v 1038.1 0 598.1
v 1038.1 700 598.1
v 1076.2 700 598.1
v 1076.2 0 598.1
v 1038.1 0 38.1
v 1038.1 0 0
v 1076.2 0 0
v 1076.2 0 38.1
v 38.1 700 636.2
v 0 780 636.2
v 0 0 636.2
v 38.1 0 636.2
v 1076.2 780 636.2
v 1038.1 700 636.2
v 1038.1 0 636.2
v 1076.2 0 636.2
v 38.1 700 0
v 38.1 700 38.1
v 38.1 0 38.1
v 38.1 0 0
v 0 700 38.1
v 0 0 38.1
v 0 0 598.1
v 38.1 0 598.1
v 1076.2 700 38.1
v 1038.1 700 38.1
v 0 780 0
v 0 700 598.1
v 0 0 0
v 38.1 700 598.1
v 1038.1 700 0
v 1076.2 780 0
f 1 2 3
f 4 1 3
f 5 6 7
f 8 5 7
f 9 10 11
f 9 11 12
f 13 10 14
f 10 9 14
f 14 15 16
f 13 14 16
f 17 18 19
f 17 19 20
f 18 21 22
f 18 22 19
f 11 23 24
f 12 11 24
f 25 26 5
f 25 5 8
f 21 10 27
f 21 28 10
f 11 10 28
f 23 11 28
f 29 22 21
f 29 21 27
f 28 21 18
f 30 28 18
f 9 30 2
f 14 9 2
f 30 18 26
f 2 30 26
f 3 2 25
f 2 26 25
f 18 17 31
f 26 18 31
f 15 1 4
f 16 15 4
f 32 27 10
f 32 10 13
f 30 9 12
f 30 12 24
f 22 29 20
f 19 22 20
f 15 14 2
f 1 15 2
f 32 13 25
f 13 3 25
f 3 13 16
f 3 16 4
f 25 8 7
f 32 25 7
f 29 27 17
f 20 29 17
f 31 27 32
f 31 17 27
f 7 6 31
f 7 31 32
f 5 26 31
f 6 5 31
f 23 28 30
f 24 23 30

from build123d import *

# Parameters (mm, degrees)
CROQUIS1_W                = 38.1
CROQUIS1_H                = 38.1
SALIENTE_EXTRUIR1_DEPTH   = 700
SALIENTE_EXTRUIR1_2_DEPTH = 700
SALIENTE_EXTRUIR1_3_DEPTH = 700
SALIENTE_EXTRUIR1_4_DEPTH = 700
CROQUIS2_W                = 1076.2
CROQUIS2_H                = 636.2
SALIENTE_EXTRUIR2_DEPTH   = 80


with BuildPart() as part:
    # Croquis1 → Saliente-Extruir1 (new body)
    with BuildSketch(Plane(origin=(0, 0, 0), x_dir=(1, 0, 0), z_dir=(0, 1, 0))):
        with Locations((19.05, -19.05)):
            Rectangle(CROQUIS1_W, CROQUIS1_H)
    extrude(amount=SALIENTE_EXTRUIR1_DEPTH)



with BuildPart() as body_2:
    # Croquis1 → Saliente-Extruir1 2 (new body)
    with BuildSketch(Plane(origin=(0, 0, 0), x_dir=(1, 0, 0), z_dir=(0, 1, 0))):
        with Locations((1057.15, -19.05)):
            Rectangle(CROQUIS1_W, CROQUIS1_H)
    extrude(amount=SALIENTE_EXTRUIR1_2_DEPTH)


with BuildPart() as body_3:
    # Croquis1 → Saliente-Extruir1 3 (new body)
    with BuildSketch(Plane(origin=(0, 0, 0), x_dir=(1, 0, 0), z_dir=(0, 1, 0))):
        with Locations((1057.15, -617.15)):
            Rectangle(CROQUIS1_W, CROQUIS1_H)
    extrude(amount=SALIENTE_EXTRUIR1_3_DEPTH)


with BuildPart() as body_4:
    # Croquis1 → Saliente-Extruir1 4 (new body)
    with BuildSketch(Plane(origin=(0, 0, 0), x_dir=(1, 0, 0), z_dir=(0, 1, 0))):
        with Locations((19.05, -617.15)):
            Rectangle(CROQUIS1_W, CROQUIS1_H)
    extrude(amount=SALIENTE_EXTRUIR1_4_DEPTH)


with BuildPart() as part_1:
    add(part.part)

    add(body_2.part)  # Saliente-Extruir2 merges body 2

    add(body_3.part)  # Saliente-Extruir2 merges body 3

    add(body_4.part)  # Saliente-Extruir2 merges body 4
    # Croquis2 → Saliente-Extruir2 (add)
    with BuildSketch(Plane(origin=(0, 700, 0), x_dir=(1, 0, 0), z_dir=(0, 1, 0))):
        with Locations((538.1, -318.1)):
            Rectangle(CROQUIS2_W, CROQUIS2_H)
    extrude(amount=SALIENTE_EXTRUIR2_DEPTH)


solid = part_1.part
